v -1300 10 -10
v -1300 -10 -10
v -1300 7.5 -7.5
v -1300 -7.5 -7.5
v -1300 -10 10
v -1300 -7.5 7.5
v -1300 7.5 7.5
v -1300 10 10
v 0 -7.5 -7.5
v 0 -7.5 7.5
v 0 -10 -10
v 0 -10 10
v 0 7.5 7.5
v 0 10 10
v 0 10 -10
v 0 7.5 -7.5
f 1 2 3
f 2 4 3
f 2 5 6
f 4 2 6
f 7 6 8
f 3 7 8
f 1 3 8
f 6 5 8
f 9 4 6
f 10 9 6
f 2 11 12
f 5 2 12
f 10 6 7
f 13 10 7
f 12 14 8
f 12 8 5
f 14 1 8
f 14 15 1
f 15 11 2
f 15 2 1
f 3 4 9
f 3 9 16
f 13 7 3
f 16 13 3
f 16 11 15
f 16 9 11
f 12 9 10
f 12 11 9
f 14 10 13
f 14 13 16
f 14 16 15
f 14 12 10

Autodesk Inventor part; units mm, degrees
ref_plane "YZ Plane" through (0, 0, 0) normal (1, 0, 0) x (0, 1, 0)
ref_plane "XZ Plane" through (0, 0, 0) normal (0, 1, 0) x (-1, 0, 0)
ref_plane "XY Plane" through (0, 0, 0) normal (0, 0, 1) x (1, 0, 0)
sketch "Sketch1" plane through (0, 0, 0) normal (1, 0, 0) x (0, 1, 0)
  circle A0 centre (0, 0) radius 10
  dimension "d0" = 20
extrude "Extrusion1" add sketch "Sketch1" against normal blind 1300
sketch "Sketch2" plane through (0, 0, 0) normal (1, 0, 0) x (0, 0, -1)
  circle A0 centre (0, 0) radius 10 projected
  circle A1 centre (0, 0) radius 7.5
  dimension "d5" = 15
extrude "Extrusion2" cut sketch "Sketch2" against normal blind 1300 contours A1
sketch "Sketch4" plane through (0, 0, 0) normal (1, 0, 0) x (0, 0, -1)
  circle A0 centre (0, 0) radius 10 projected
  line L0 (0, -10) -> (10, -10)
  line L1 (10, -10) -> (10, 0)
  line L2 (10, 10) -> (-10, 10)
  line L3 (-10, 10) -> (-10, 0)
  line L4 (10, 0) -> (10, 10)
  line L5 (-10, 0) -> (-10, -10)
  line L6 (0, -10) -> (-10, -10)
extrude "Extrusion3" add sketch "Sketch4" against normal blind 1300 contours L3 L2 A0 | A0 L6 L5 | A0 L1 L0 | L2 L4 A0
sketch "Sketch5" plane through (0, 0, 0) normal (1, 0, 0) x (0, 0, -1)
  circle A0 centre (0, 0) radius 7.5 projected
  line L0 (7.5, 0) -> (7.5, -7.5)
  line L1 (7.5, -7.5) -> (0, -7.5)
  line L2 (0, -7.5) -> (-7.5, -7.5)
  line L3 (-10, -10) -> (10, -10) projected
  line L4 (-7.5, 0) -> (-7.5, -7.5)
  line L5 (-7.5, 0) -> (-7.5, 7.5)
  line L6 (0, 7.5) -> (-7.5, 7.5)
  line L7 (0, 7.5) -> (7.5, 7.5)
  line L8 (7.5, 0) -> (7.5, 7.5)
extrude "Extrusion4" cut sketch "Sketch5" against normal blind 1300 contours L0 L1 A0 | A0 L7 L8 | A0 L5 L6 | L2 L4 A0
properties part number "rail"
